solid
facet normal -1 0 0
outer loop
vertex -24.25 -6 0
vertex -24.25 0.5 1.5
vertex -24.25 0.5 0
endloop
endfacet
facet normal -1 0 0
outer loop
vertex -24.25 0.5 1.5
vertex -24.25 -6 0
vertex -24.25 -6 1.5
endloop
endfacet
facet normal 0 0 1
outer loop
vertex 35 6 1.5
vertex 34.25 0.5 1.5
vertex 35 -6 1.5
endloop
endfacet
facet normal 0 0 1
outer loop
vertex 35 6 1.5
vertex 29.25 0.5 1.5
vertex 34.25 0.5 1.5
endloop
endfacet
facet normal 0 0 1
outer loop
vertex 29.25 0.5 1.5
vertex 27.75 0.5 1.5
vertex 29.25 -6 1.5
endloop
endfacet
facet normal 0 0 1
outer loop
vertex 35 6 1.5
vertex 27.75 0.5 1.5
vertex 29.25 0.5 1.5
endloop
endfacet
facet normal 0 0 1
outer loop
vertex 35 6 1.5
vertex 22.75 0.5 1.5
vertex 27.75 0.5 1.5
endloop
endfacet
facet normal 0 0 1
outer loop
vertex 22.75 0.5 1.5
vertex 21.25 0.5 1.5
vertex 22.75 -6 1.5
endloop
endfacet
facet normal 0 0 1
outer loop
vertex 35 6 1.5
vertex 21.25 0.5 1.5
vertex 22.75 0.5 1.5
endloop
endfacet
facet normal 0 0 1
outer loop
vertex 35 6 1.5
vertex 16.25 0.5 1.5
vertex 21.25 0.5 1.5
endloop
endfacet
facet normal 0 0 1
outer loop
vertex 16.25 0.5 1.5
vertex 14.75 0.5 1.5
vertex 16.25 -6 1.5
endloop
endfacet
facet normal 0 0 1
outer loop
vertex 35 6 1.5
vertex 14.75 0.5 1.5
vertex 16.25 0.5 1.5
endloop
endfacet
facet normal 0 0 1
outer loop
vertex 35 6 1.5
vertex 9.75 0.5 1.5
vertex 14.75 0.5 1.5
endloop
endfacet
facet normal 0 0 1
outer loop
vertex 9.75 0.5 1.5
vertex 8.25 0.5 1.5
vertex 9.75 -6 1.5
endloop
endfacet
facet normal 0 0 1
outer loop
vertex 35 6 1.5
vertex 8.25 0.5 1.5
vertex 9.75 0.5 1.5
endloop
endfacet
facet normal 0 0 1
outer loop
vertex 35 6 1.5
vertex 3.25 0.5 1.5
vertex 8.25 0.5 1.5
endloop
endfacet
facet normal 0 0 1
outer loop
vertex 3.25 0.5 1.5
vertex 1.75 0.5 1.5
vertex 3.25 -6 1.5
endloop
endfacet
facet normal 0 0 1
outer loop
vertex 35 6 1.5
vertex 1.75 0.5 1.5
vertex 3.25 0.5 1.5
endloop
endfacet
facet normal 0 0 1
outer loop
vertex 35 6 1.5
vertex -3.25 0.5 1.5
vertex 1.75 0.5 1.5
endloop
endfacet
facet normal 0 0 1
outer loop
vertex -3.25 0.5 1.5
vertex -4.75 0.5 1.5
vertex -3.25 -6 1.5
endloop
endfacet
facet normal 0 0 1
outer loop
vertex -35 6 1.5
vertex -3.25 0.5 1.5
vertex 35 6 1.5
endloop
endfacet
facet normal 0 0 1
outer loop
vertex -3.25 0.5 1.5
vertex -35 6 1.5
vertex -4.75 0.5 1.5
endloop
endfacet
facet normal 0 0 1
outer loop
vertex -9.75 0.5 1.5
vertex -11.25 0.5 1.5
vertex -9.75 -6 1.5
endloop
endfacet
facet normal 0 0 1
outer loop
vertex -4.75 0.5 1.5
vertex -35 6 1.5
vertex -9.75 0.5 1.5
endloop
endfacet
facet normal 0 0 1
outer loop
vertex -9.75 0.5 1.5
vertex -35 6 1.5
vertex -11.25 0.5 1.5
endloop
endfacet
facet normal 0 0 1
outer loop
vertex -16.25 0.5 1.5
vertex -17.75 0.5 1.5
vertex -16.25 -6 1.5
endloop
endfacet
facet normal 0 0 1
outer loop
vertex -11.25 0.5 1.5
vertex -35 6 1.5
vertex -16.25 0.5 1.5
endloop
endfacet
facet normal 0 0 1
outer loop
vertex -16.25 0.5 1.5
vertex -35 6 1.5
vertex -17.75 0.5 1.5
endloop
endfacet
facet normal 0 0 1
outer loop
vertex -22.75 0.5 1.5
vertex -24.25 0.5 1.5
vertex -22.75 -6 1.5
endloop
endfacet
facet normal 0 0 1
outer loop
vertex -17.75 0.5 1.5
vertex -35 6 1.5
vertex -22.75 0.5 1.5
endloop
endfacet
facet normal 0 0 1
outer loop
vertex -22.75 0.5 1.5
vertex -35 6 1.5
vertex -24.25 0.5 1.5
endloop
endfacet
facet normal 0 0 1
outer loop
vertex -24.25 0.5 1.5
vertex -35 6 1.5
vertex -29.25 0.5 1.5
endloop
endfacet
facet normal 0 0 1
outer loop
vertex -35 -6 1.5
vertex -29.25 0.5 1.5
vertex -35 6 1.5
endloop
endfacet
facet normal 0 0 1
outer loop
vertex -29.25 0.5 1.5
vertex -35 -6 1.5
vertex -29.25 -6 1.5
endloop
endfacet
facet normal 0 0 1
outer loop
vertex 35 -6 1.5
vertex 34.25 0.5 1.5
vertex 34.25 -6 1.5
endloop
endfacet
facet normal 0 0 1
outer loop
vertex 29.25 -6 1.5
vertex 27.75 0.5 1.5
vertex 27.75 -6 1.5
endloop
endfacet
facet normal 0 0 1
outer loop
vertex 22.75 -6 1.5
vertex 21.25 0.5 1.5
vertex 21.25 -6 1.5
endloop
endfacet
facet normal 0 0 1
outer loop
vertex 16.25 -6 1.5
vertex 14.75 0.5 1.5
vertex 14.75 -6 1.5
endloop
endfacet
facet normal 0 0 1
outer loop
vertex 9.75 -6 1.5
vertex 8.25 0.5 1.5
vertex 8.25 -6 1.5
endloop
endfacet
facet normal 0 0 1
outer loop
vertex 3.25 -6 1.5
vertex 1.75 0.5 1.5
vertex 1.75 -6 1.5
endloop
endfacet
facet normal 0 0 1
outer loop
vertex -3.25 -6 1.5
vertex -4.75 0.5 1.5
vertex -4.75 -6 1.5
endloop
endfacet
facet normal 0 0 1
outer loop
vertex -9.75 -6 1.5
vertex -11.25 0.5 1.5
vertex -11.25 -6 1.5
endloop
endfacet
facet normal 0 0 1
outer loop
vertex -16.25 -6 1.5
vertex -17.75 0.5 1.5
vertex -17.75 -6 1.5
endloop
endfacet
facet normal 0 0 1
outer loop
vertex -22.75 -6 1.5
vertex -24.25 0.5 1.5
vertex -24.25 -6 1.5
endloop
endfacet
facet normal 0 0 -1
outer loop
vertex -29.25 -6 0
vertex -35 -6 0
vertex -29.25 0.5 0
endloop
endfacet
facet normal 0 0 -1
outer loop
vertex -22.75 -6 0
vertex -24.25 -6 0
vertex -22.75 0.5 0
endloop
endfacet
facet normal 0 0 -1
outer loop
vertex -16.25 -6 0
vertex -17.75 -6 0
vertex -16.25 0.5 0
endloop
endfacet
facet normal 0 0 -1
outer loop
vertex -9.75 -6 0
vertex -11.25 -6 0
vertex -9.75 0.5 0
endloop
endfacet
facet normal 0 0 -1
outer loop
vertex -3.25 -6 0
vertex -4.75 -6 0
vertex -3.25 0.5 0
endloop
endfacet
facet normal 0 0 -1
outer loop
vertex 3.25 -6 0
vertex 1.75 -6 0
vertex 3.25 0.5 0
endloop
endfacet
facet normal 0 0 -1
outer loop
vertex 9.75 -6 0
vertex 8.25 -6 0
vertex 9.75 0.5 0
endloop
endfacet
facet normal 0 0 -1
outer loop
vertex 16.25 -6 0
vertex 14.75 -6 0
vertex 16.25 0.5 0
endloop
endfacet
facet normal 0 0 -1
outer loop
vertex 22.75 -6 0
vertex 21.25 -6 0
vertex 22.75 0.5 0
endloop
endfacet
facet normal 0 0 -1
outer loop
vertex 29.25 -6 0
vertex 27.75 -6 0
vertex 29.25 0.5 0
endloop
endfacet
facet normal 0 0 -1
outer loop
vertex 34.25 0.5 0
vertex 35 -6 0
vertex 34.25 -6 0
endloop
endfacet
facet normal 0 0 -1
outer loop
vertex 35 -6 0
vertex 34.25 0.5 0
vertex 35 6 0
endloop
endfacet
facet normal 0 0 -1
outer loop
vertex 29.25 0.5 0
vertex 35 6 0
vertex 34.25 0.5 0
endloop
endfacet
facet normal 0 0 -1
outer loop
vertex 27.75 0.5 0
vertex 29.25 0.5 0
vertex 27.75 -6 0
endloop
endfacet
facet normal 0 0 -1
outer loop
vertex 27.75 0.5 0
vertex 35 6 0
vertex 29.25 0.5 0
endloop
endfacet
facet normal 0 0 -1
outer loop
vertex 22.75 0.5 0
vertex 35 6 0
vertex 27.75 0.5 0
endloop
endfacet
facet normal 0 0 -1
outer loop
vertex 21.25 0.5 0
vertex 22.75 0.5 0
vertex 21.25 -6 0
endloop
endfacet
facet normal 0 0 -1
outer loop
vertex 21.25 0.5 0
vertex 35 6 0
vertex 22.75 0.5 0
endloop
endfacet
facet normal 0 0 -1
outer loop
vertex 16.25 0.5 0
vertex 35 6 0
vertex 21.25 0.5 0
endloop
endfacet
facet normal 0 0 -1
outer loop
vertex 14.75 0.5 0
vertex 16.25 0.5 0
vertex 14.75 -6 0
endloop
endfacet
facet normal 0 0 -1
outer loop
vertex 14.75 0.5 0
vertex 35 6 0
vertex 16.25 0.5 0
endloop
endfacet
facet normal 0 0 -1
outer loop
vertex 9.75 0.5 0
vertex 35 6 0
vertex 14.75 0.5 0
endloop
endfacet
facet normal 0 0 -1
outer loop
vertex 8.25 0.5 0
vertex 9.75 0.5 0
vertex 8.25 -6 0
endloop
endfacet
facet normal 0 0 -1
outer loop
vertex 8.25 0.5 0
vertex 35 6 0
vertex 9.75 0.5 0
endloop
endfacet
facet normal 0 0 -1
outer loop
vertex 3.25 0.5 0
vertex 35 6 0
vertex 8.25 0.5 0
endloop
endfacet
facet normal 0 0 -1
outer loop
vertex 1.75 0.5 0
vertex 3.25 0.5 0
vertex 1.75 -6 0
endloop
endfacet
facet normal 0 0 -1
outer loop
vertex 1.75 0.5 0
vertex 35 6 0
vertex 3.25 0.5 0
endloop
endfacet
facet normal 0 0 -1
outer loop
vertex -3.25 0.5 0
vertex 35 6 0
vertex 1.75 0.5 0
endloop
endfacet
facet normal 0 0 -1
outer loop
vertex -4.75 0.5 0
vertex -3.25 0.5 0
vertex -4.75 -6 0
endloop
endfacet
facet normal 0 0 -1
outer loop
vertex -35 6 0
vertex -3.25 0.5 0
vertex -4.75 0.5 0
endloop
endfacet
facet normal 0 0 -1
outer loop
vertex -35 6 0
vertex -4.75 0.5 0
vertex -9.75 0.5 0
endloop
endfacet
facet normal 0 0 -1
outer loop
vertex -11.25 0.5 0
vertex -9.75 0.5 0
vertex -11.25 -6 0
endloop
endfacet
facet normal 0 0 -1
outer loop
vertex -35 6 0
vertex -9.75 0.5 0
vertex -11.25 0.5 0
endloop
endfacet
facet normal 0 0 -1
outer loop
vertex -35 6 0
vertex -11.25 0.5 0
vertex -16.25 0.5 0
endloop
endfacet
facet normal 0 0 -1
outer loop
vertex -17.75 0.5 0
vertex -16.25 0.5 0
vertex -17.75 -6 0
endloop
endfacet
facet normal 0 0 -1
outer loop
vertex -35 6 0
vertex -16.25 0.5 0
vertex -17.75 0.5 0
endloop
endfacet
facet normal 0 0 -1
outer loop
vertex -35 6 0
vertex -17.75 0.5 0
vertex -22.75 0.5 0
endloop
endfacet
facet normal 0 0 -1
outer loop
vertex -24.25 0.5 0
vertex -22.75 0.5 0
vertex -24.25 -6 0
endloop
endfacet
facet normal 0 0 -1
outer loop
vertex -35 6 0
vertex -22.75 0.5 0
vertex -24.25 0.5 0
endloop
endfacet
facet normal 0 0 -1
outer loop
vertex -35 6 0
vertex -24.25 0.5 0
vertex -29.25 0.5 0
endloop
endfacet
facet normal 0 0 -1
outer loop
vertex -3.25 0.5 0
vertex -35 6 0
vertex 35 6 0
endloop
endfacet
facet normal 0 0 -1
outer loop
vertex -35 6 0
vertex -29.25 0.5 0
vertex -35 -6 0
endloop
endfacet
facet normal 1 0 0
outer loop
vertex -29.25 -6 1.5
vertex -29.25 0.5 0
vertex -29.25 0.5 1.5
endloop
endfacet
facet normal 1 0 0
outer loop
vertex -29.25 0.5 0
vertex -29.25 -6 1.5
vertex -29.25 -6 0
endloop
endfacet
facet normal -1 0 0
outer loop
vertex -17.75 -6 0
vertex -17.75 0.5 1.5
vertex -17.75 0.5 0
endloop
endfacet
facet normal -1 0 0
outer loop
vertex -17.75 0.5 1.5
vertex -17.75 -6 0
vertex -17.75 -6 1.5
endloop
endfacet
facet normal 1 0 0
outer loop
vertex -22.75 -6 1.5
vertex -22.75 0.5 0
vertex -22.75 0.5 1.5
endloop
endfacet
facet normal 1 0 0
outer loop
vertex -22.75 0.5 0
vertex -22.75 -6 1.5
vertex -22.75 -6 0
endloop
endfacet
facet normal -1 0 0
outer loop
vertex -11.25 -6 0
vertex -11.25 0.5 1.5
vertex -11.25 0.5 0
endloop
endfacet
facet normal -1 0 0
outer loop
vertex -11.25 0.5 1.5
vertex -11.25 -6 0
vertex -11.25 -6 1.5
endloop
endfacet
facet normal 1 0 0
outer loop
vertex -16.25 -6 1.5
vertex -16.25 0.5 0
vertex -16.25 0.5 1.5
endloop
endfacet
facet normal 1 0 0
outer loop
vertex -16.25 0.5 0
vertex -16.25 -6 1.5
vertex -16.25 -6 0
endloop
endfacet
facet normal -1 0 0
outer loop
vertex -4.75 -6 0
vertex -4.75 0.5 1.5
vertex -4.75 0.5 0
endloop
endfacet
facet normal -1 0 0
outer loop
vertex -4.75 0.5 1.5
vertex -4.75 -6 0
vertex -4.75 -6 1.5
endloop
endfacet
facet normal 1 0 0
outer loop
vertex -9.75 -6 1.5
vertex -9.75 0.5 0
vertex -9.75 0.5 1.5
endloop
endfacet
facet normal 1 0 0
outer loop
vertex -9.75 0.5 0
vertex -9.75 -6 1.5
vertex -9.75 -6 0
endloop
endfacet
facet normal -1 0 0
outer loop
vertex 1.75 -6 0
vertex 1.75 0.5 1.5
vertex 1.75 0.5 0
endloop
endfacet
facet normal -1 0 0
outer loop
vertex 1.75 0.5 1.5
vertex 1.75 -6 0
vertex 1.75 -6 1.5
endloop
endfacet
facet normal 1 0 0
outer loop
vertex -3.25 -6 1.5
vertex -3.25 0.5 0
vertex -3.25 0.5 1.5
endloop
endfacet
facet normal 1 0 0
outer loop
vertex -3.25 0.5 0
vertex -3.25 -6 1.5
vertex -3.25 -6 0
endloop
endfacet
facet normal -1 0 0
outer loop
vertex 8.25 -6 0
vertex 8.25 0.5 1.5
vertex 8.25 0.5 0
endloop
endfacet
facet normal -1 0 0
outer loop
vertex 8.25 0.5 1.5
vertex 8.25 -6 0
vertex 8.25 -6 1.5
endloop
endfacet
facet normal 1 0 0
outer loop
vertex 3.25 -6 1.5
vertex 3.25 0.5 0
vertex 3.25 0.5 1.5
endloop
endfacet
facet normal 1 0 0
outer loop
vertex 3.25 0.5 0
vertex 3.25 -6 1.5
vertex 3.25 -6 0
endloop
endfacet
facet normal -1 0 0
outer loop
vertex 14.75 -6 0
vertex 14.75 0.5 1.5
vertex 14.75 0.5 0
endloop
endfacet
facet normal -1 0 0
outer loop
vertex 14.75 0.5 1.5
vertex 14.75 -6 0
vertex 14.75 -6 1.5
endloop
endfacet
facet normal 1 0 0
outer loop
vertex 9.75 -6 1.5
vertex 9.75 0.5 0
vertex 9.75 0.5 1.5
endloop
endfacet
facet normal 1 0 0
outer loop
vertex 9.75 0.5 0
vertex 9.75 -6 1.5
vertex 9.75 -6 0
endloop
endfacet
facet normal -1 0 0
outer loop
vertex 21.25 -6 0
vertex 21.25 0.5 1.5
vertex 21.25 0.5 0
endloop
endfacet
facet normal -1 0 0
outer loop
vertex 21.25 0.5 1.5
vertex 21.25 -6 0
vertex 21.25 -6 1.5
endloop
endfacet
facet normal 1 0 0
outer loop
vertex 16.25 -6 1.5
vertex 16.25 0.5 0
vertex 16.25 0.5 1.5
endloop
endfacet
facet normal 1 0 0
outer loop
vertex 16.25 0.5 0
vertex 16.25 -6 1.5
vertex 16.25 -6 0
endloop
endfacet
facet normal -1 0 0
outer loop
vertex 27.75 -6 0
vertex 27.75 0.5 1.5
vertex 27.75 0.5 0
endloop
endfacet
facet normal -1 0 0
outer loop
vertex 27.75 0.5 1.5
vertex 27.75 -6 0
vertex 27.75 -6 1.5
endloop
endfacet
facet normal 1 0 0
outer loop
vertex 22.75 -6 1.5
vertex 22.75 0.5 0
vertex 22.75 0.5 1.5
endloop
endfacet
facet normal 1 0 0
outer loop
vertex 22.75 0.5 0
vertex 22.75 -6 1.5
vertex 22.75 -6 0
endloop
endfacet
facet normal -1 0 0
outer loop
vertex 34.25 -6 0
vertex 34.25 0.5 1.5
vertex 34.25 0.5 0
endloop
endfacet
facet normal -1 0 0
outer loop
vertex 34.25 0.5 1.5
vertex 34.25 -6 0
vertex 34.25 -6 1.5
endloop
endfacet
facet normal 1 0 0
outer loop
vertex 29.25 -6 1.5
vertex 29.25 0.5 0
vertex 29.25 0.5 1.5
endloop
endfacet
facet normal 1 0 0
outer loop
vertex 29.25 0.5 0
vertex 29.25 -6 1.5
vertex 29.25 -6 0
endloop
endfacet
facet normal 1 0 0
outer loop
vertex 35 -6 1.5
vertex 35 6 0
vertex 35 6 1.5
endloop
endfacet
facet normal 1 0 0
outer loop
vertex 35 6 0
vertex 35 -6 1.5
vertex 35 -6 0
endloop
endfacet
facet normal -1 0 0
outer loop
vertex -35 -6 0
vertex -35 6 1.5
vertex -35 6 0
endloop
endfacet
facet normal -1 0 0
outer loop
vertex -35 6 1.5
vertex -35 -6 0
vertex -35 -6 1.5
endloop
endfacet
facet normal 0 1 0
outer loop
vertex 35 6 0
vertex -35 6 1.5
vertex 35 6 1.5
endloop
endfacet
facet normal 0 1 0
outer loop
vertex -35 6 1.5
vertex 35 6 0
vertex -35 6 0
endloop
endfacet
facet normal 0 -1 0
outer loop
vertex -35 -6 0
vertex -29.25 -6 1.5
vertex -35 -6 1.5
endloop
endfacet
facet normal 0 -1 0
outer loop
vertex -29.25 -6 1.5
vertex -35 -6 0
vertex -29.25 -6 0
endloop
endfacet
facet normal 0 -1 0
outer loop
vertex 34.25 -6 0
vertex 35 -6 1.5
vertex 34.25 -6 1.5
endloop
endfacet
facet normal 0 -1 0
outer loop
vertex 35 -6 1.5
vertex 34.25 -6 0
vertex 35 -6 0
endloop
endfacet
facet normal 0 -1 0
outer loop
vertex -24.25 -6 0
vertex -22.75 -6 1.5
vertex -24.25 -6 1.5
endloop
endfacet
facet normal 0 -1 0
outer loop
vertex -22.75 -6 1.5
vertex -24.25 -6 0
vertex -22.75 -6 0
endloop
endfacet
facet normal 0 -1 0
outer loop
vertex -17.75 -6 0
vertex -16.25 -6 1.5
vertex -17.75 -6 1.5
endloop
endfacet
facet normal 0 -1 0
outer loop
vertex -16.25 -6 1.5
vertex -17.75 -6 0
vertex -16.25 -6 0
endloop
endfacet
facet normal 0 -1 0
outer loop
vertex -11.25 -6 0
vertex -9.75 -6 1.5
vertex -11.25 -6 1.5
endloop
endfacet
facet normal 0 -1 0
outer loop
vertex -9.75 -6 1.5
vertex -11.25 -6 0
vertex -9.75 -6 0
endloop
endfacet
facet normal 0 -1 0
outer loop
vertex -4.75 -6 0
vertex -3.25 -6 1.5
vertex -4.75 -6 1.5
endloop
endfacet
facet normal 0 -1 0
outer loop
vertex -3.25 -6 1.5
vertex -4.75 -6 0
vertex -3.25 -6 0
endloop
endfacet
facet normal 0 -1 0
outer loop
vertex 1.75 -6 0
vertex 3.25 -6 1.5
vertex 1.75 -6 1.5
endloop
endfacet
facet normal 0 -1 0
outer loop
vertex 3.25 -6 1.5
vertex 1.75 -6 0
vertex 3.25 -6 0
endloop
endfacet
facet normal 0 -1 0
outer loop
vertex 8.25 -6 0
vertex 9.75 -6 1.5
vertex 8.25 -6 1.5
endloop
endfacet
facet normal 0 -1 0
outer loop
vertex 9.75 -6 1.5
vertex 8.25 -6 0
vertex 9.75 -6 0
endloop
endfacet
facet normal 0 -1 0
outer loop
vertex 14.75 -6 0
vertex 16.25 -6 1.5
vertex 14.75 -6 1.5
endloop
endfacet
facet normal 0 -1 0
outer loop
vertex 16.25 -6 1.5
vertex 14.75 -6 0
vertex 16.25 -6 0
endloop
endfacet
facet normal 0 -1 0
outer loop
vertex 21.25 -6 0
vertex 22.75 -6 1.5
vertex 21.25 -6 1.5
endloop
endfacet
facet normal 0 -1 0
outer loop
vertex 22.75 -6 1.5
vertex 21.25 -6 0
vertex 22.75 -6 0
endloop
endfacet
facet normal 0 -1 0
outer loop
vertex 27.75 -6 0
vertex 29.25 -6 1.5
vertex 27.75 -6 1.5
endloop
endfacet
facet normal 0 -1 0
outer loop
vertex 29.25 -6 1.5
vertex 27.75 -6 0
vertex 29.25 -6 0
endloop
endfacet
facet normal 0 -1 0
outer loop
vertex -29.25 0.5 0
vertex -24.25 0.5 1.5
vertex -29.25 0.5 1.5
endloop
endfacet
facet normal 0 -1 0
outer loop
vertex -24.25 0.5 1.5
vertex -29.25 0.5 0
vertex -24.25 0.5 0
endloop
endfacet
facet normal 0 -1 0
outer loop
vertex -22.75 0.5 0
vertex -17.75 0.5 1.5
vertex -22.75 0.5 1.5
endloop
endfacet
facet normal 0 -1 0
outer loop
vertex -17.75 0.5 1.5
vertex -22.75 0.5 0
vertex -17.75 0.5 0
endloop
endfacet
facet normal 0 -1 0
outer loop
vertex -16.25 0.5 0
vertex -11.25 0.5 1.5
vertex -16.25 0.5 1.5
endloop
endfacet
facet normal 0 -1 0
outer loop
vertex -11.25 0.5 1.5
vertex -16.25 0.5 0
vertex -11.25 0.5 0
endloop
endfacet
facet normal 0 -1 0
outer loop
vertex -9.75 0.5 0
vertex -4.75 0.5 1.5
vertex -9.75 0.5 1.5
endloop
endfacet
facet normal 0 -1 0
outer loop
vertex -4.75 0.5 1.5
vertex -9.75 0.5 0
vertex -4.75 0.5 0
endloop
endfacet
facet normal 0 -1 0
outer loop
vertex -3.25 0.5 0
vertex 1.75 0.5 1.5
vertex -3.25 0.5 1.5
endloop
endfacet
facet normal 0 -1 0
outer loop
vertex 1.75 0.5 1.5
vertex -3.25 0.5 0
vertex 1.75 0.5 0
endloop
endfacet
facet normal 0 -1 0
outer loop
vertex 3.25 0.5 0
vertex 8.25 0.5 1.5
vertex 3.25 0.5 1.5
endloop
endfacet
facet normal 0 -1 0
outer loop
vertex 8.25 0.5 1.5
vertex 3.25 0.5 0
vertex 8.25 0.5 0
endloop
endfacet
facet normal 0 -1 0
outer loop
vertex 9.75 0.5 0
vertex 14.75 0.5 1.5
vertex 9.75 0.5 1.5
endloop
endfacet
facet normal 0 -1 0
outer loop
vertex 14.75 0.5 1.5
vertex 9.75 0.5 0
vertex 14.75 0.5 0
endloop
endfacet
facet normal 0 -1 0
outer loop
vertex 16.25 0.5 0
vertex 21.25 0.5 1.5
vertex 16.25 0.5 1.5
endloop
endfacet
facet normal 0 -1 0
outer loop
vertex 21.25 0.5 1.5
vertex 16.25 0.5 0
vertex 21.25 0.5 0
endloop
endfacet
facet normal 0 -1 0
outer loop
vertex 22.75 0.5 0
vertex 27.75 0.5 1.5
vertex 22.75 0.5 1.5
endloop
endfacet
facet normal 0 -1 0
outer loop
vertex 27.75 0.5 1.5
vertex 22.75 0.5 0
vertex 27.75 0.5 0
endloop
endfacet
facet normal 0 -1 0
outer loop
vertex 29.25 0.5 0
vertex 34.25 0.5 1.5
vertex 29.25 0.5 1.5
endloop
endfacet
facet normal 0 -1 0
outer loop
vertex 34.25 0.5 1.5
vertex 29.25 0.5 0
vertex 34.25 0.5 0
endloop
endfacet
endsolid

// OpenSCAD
// Agarose gel casting comb - 10 wells
// Print orientation: flat on bed, teeth pointing down (-Y)

// ---------- Parameters ----------
plate_t      = 1.5;   // plate thickness (Z)
spine_len    = 70;    // spine length (X)
spine_w      = 12;    // spine width (Y)
tooth_w      = 5.0;   // tooth width (X)
tooth_len    = 12;    // tooth length (Y)
tooth_count  = 10;    // number of teeth
tooth_gap    = 1.5;   // gap between neighbouring teeth (X)
eps          = 0.5;   // cutter overshoot past faces

$fn = 64;

// ---------- Derived ----------
pitch   = tooth_w + tooth_gap;          // centre-to-centre spacing of teeth
x_start = -(tooth_count - 1) * pitch / 2; // first tooth centre (row centred on spine)

// ---------- Model ----------
difference() {
    union() {
        // Spine (back bar)
        translate([-spine_len / 2, -spine_w / 2, 0])
            cube([spine_len, spine_w, plate_t]);

        // Teeth
        for (i = [0 : tooth_count - 1])
            translate([x_start + i * pitch, -tooth_len, 0])
                cube([tooth_w, tooth_len, plate_t]);
    }

    // Teeth cutters, extending past -Y face
    for (i = [0 : tooth_count - 1])
        translate([x_start + i * pitch, -tooth_len - eps, 0])
            cube([tooth_w, tooth_len + 2 * eps, plate_t + eps]);
}
